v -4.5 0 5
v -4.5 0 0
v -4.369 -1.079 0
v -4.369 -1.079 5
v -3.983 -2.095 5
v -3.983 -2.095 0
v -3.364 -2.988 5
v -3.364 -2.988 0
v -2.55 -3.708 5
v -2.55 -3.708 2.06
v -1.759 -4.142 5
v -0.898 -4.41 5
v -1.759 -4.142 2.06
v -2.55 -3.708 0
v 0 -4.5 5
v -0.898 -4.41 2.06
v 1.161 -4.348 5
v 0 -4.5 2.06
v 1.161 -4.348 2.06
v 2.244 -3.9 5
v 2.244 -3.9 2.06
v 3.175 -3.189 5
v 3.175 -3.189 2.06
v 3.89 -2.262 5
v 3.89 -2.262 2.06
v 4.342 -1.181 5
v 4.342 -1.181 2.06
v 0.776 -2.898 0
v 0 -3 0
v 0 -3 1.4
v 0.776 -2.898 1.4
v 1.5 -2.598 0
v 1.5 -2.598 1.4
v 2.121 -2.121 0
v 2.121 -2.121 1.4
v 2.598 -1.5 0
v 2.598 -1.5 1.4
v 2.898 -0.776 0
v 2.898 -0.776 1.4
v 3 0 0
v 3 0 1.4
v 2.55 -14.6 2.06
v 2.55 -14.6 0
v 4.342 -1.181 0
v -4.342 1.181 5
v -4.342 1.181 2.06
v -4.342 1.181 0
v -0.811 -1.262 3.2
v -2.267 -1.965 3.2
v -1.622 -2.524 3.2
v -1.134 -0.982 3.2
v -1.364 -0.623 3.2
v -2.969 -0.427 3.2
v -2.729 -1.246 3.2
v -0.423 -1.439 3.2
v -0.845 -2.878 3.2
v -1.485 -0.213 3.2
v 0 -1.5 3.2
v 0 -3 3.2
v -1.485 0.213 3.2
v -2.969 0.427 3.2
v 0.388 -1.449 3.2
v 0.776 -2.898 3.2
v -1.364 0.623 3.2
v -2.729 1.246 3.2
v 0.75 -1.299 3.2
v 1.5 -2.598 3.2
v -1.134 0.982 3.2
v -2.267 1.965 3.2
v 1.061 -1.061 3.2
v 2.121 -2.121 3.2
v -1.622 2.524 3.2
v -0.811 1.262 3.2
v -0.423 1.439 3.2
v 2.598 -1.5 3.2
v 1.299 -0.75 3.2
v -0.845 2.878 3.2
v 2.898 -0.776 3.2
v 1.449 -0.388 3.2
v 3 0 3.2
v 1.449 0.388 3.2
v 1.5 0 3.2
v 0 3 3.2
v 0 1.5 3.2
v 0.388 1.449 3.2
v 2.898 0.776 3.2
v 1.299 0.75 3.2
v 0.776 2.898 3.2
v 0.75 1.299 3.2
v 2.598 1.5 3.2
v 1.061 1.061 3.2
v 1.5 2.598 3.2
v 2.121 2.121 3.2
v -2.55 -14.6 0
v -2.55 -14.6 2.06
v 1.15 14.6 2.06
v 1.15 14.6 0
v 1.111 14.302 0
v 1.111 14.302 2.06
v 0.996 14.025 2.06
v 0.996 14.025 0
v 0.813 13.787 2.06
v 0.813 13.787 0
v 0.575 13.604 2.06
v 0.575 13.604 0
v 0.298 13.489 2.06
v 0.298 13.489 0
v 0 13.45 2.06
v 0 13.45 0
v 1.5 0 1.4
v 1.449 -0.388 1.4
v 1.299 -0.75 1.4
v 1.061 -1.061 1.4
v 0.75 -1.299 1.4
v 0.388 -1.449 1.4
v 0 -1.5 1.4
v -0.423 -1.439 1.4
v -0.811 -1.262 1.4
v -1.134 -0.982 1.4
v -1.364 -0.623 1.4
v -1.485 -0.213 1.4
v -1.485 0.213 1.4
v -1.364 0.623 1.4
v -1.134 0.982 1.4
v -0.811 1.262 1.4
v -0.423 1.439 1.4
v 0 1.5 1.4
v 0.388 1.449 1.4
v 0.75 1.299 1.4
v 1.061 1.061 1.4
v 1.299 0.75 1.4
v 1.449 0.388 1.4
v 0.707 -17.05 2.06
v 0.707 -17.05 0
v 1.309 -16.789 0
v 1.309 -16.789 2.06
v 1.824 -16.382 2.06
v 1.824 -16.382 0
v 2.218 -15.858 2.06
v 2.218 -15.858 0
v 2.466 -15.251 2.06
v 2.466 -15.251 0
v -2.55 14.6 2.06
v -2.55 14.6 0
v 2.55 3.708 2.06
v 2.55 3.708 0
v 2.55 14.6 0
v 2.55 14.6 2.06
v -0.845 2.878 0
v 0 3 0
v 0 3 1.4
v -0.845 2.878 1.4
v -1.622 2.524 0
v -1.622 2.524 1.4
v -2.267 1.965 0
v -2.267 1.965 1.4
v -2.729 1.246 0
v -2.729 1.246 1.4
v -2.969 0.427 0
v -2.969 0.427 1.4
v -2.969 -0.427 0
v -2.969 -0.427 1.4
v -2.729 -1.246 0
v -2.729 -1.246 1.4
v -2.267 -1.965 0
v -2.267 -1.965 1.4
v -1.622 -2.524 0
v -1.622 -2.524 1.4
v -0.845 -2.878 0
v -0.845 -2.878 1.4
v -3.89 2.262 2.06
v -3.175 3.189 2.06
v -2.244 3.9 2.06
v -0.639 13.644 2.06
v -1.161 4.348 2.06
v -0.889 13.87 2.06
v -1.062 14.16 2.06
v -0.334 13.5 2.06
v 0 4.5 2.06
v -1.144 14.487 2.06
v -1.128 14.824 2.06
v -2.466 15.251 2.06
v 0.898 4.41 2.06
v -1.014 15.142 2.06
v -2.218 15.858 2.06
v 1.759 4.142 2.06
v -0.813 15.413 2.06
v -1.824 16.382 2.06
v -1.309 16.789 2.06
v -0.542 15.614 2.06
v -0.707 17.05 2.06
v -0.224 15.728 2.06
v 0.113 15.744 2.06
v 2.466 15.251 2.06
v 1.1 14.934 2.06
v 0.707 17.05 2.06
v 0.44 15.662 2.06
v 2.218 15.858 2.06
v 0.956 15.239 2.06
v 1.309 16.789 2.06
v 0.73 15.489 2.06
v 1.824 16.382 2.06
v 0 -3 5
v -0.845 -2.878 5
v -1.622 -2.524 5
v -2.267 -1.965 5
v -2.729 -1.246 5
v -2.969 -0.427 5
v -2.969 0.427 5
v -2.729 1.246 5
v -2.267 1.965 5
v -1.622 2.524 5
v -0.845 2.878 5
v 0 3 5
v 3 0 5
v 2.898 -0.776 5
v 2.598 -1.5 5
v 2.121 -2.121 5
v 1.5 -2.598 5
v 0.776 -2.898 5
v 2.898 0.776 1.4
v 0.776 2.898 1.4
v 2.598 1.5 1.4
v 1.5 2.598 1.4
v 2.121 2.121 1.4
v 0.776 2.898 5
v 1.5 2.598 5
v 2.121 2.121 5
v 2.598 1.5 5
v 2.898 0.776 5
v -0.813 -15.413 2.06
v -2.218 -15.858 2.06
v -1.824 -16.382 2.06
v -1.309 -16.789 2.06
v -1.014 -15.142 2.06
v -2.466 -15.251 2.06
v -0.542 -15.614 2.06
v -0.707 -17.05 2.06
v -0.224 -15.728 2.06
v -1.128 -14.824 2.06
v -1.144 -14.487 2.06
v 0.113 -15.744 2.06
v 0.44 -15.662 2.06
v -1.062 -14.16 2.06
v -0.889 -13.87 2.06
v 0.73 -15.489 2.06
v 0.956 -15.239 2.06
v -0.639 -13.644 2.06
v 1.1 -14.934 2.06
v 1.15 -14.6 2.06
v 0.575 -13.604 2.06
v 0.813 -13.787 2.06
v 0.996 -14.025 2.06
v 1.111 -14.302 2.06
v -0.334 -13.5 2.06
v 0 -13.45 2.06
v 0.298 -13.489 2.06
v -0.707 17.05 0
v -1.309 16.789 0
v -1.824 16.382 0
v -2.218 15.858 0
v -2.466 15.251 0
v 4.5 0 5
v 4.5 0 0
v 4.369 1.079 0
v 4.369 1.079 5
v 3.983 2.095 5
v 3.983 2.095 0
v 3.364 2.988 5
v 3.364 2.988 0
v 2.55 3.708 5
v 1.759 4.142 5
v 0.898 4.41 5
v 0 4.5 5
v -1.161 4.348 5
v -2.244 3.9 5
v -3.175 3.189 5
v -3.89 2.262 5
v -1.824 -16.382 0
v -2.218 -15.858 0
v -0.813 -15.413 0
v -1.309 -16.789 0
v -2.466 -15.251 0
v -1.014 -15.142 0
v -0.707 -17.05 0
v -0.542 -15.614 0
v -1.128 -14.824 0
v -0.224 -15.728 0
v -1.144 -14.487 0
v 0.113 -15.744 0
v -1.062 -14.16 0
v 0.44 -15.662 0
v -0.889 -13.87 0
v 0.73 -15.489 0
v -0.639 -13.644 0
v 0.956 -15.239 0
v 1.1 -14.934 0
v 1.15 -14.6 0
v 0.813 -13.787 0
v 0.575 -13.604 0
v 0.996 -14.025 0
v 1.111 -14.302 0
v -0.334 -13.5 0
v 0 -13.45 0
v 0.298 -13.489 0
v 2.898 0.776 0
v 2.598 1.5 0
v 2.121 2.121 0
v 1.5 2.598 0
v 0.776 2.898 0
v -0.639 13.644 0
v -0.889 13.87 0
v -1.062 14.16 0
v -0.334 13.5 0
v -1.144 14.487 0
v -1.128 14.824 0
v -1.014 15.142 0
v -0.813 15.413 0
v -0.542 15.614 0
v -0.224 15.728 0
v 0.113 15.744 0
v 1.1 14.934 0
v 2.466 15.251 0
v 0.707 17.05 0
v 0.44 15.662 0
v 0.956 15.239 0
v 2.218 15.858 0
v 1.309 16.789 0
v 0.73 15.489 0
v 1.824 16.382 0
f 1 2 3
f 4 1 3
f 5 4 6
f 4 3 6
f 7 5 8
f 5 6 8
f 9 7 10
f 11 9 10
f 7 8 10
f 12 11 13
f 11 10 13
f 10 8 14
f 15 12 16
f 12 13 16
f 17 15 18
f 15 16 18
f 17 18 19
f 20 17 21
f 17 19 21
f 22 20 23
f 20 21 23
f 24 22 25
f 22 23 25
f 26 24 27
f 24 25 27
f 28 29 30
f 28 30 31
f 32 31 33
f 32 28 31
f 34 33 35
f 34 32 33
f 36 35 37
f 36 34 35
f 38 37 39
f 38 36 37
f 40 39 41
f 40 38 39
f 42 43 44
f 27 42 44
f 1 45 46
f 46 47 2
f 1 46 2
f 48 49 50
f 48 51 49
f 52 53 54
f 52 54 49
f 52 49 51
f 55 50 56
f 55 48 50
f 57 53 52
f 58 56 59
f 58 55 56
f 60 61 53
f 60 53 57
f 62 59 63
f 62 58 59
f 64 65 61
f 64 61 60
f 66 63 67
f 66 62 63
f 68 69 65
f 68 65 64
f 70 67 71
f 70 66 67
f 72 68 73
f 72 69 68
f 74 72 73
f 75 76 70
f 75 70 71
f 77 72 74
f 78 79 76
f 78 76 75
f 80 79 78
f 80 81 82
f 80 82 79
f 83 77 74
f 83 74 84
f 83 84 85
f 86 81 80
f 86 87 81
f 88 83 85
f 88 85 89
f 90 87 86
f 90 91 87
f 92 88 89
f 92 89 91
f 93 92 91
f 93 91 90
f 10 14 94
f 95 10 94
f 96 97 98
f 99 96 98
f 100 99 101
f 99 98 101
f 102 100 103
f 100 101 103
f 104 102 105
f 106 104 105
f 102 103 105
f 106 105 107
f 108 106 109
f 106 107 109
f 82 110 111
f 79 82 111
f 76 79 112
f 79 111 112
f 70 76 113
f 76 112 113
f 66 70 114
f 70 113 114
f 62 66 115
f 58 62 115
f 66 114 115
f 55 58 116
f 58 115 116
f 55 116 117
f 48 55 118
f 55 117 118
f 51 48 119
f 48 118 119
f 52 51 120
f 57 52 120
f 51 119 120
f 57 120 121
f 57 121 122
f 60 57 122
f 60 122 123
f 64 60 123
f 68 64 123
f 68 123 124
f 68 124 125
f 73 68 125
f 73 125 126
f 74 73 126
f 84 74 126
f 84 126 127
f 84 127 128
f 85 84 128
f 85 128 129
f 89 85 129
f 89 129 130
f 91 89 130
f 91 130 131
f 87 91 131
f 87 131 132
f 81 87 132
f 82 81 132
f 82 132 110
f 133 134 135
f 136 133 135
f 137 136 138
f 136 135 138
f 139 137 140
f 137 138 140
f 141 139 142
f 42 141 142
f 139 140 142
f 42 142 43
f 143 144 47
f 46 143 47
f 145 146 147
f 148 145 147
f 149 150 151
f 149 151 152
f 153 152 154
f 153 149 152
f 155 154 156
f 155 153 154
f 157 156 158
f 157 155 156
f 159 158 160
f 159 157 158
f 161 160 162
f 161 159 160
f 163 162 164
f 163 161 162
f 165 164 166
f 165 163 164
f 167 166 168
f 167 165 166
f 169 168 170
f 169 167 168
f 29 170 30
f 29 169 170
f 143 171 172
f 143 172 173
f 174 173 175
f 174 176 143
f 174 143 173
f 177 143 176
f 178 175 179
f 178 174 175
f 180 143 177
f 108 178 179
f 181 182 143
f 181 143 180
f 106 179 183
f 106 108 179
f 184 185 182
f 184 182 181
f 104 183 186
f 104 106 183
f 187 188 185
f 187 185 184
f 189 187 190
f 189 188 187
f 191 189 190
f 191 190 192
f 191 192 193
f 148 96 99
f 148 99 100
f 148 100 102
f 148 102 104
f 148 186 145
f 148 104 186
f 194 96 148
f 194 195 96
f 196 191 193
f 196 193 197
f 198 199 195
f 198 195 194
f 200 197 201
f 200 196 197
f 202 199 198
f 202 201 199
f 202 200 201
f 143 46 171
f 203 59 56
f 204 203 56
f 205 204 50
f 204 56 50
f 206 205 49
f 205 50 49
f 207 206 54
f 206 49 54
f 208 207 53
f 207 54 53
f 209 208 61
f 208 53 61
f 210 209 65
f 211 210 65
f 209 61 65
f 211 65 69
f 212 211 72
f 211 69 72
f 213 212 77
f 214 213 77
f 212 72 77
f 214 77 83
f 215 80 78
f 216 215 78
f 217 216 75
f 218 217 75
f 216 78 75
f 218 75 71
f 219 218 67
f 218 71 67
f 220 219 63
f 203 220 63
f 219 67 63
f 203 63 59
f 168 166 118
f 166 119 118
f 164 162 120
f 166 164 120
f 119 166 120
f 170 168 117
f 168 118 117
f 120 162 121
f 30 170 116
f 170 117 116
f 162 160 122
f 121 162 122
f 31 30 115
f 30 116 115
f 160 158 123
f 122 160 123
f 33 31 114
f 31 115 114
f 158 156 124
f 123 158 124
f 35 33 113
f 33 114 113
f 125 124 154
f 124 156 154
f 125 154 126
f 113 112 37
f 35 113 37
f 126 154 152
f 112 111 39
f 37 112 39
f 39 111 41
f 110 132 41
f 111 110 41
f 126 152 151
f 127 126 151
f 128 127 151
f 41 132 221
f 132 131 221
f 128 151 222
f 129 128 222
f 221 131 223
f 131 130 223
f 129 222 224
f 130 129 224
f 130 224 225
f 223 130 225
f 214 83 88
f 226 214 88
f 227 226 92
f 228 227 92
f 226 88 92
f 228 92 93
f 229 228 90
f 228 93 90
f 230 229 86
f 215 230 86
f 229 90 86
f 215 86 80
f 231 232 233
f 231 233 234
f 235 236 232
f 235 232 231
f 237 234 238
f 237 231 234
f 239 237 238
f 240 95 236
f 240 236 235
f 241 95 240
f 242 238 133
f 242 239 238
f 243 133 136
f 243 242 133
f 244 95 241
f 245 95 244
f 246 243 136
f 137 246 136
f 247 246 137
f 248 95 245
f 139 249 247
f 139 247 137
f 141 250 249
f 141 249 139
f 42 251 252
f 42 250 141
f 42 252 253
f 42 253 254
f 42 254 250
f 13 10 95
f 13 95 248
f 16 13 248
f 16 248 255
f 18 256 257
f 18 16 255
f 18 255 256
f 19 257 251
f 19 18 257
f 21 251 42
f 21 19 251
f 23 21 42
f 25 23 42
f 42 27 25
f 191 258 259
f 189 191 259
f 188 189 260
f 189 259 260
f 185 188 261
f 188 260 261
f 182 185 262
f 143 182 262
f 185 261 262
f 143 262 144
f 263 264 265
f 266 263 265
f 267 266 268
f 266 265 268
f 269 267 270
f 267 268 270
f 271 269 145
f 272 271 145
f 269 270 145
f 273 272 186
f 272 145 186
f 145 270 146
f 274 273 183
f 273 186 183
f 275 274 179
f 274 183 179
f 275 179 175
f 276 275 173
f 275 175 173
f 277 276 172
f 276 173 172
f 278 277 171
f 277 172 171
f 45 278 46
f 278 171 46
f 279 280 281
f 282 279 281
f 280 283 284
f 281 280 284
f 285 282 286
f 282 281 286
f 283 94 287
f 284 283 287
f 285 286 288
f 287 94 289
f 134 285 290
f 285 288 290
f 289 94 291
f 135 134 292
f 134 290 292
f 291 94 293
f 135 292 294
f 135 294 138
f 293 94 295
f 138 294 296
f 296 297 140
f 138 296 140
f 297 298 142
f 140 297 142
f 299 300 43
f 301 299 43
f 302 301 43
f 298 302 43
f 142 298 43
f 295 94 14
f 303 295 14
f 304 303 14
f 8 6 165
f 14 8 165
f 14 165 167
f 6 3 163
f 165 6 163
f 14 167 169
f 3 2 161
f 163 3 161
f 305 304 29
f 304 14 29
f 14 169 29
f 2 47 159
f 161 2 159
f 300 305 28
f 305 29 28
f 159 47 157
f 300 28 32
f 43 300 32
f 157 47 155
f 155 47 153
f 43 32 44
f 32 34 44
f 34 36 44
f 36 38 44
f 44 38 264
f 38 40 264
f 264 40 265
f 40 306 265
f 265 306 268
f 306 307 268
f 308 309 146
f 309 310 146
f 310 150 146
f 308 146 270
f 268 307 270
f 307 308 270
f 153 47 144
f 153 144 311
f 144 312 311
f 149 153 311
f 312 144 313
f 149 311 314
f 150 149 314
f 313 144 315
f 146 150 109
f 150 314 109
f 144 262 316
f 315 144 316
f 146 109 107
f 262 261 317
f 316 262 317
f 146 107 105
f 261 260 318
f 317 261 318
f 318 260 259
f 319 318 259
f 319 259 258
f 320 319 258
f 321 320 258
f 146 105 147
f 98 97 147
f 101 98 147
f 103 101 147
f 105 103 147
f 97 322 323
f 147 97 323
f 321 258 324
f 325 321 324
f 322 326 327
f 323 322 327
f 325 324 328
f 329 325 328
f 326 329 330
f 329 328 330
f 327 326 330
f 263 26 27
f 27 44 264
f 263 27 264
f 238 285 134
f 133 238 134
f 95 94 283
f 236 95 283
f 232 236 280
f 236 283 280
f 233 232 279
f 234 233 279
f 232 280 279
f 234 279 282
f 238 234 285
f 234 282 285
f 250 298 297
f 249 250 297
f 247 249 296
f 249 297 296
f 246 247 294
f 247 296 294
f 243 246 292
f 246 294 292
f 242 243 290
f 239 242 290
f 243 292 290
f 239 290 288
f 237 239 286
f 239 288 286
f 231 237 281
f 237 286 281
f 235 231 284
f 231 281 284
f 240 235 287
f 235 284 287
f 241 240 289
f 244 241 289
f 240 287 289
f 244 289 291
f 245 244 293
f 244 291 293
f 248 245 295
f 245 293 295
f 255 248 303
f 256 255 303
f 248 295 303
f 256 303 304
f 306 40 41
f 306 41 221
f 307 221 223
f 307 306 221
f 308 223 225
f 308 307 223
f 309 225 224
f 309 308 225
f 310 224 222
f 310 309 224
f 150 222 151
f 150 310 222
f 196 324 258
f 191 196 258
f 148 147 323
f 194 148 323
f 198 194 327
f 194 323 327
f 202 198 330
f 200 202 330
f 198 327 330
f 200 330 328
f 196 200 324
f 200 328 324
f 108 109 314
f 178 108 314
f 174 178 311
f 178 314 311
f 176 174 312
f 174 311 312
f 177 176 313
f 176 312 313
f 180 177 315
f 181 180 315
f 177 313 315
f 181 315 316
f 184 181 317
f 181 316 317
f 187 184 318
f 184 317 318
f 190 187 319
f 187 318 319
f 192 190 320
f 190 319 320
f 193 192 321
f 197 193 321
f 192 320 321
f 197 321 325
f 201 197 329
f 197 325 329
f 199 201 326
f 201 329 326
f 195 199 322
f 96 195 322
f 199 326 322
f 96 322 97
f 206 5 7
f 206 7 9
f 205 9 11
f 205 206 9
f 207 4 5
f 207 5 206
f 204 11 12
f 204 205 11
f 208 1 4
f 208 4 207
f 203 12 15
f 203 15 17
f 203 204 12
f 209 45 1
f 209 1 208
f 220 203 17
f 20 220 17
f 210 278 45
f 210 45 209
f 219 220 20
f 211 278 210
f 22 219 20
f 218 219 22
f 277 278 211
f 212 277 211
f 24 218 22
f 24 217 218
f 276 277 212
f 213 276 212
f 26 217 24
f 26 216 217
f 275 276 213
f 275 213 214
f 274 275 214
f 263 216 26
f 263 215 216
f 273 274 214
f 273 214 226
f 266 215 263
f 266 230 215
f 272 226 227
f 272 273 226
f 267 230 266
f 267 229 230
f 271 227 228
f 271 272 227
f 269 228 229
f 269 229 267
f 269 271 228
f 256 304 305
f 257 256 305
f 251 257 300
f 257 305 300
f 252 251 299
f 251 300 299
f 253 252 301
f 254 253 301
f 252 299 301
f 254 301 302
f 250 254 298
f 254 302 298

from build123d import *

# Parameters (mm, degrees)
F1_DEPTH = 2.06
F2_DEPTH = 3.2
F3_DEPTH = 5
F4_DEPTH = 1.4


with BuildPart() as f1:
    # F0 (on Top) → F1 (new body)
    with BuildSketch(Plane.XY):
        with BuildLine():
            ThreePointArc((0, -12.05), (1.803122292, -12.796877708), (2.55, -14.6))
            Line((2.55, -14.6), (4.3422653684, -1.1809874978))
            ThreePointArc((4.3422653684, -1.1809874978), (2.7327235736, -3.5752233315), (0, -4.5))
            Line((0, -4.5), (0, -12.05))
        make_face()
        with BuildLine():
            Line((-0.7071067812, -17.05), (0.7071067812, -17.05))
            ThreePointArc((0.7071067812, -17.05), (2.0378447306, -16.1328694837), (2.55, -14.6))
            ThreePointArc((2.55, -14.6), (1.803122292, -12.796877708), (0, -12.05))
            ThreePointArc((0, -12.05), (-1.803122292, -12.796877708), (-2.55, -14.6))
            ThreePointArc((-2.55, -14.6), (-2.0378447306, -16.1328694837), (-0.7071067812, -17.05))
        make_face()
        with BuildLine():
            ThreePointArc((1.15, -14.6), (-0.8131727984, -15.4131727984), (0, -13.45))
            ThreePointArc((0, -13.45), (0.8131727984, -13.7868272016), (1.15, -14.6))
        make_face(mode=Mode.SUBTRACT)
        with BuildLine():
            Line((-2.55, -3.7077621283), (-2.55, -14.6))
            ThreePointArc((-2.55, -14.6), (-1.803122292, -12.796877708), (0, -12.05))
            Line((0, -12.05), (0, -4.5))
            ThreePointArc((0, -4.5), (-1.335116179, -4.2973788277), (-2.55, -3.7077621283))
        make_face()
        with BuildLine():
            Line((0, 3), (0, 4.5))
            ThreePointArc((0, 4.5), (-2.7327235736, 3.5752233315), (-4.3422653684, 1.1809874978))
            Line((-4.3422653684, 1.1809874978), (-4.5, 0))
            ThreePointArc((-4.5, 0), (-3.9827754142, -2.0946360066), (-2.55, -3.7077621283))
            ThreePointArc((-2.55, -3.7077621283), (-1.335116179, -4.2973788277), (0, -4.5))
            Line((0, -4.5), (0, -3))
            ThreePointArc((0, -3), (-3, 0), (0, 3))
        make_face()
        with BuildLine():
            Line((0, 1.5), (0, 3))
            ThreePointArc((0, 3), (-3, 0), (0, -3))
            Line((0, -3), (0, -1.5))
            ThreePointArc((0, -1.5), (-1.5, 0), (0, 1.5))
        make_face()
        with BuildLine():
            ThreePointArc((-4.3422653684, 1.1809874978), (-2.7327235736, 3.5752233315), (0, 4.5))
            Line((0, 4.5), (0, 12.05))
            ThreePointArc((0, 12.05), (-1.803122292, 12.796877708), (-2.55, 14.6))
            Line((-2.55, 14.6), (-4.3422653684, 1.1809874978))
        make_face()
        with BuildLine():
            ThreePointArc((0, 4.5), (1.335116179, 4.2973788277), (2.55, 3.7077621283))
            Line((2.55, 3.7077621283), (2.55, 14.6))
            ThreePointArc((2.55, 14.6), (1.803122292, 12.796877708), (0, 12.05))
            Line((0, 12.05), (0, 4.5))
        make_face()
        with BuildLine():
            ThreePointArc((2.55, 14.6), (2.0378447306, 16.1328694837), (0.7071067812, 17.05))
            Line((0.7071067812, 17.05), (-0.7071067812, 17.05))
            ThreePointArc((-0.7071067812, 17.05), (-2.0378447306, 16.1328694837), (-2.55, 14.6))
            ThreePointArc((-2.55, 14.6), (-1.803122292, 12.796877708), (0, 12.05))
            ThreePointArc((0, 12.05), (1.803122292, 12.796877708), (2.55, 14.6))
        make_face()
        with BuildLine():
            ThreePointArc((1.15, 14.6), (0.8131727984, 13.7868272016), (0, 13.45))
            ThreePointArc((0, 13.45), (-0.8131727984, 15.4131727984), (1.15, 14.6))
        make_face(mode=Mode.SUBTRACT)
        with BuildLine():
            Line((4.3422653684, -1.1809874978), (4.5, 0))
            ThreePointArc((4.5, 0), (3.9827754142, 2.0946360066), (2.55, 3.7077621283))
            ThreePointArc((2.55, 3.7077621283), (1.335116179, 4.2973788277), (0, 4.5))
            Line((0, 4.5), (0, 3))
            ThreePointArc((0, 3), (2.1213203436, 2.1213203436), (3, 0))
            ThreePointArc((3, 0), (2.1213203436, -2.1213203436), (0, -3))
            Line((0, -3), (0, -4.5))
            ThreePointArc((0, -4.5), (2.7327235736, -3.5752233315), (4.3422653684, -1.1809874978))
        make_face()
        with BuildLine():
            ThreePointArc((3, 0), (2.1213203436, 2.1213203436), (0, 3))
            Line((0, 3), (0, 1.5))
            ThreePointArc((0, 1.5), (1.0606601718, 1.0606601718), (1.5, 0))
            ThreePointArc((1.5, 0), (1.0606601718, -1.0606601718), (0, -1.5))
            Line((0, -1.5), (0, -3))
            ThreePointArc((0, -3), (2.1213203436, -2.1213203436), (3, 0))
        make_face()
    extrude(amount=F1_DEPTH)

    # F0 (on Top) → F2 (join)
    with BuildSketch(Plane.XY):
        with BuildLine():
            Line((0, 1.5), (0, 3))
            ThreePointArc((0, 3), (-3, 0), (0, -3))
            Line((0, -3), (0, -1.5))
            ThreePointArc((0, -1.5), (-1.5, 0), (0, 1.5))
        make_face()
        with BuildLine():
            ThreePointArc((3, 0), (2.1213203436, 2.1213203436), (0, 3))
            Line((0, 3), (0, 1.5))
            ThreePointArc((0, 1.5), (1.0606601718, 1.0606601718), (1.5, 0))
            ThreePointArc((1.5, 0), (1.0606601718, -1.0606601718), (0, -1.5))
            Line((0, -1.5), (0, -3))
            ThreePointArc((0, -3), (2.1213203436, -2.1213203436), (3, 0))
        make_face()
    extrude(amount=F2_DEPTH)

    # F0 (on Top) → F3 (join)
    with BuildSketch(Plane.XY):
        with BuildLine():
            Line((0, 3), (0, 4.5))
            ThreePointArc((0, 4.5), (-2.7327235736, 3.5752233315), (-4.3422653684, 1.1809874978))
            Line((-4.3422653684, 1.1809874978), (-4.5, 0))
            ThreePointArc((-4.5, 0), (-3.9827754142, -2.0946360066), (-2.55, -3.7077621283))
            ThreePointArc((-2.55, -3.7077621283), (-1.335116179, -4.2973788277), (0, -4.5))
            Line((0, -4.5), (0, -3))
            ThreePointArc((0, -3), (-3, 0), (0, 3))
        make_face()
        with BuildLine():
            Line((4.3422653684, -1.1809874978), (4.5, 0))
            ThreePointArc((4.5, 0), (3.9827754142, 2.0946360066), (2.55, 3.7077621283))
            ThreePointArc((2.55, 3.7077621283), (1.335116179, 4.2973788277), (0, 4.5))
            Line((0, 4.5), (0, 3))
            ThreePointArc((0, 3), (2.1213203436, 2.1213203436), (3, 0))
            ThreePointArc((3, 0), (2.1213203436, -2.1213203436), (0, -3))
            Line((0, -3), (0, -4.5))
            ThreePointArc((0, -4.5), (2.7327235736, -3.5752233315), (4.3422653684, -1.1809874978))
        make_face()
    extrude(amount=F3_DEPTH)

    # F0 (on Top) → F4 (cut)
    with BuildSketch(Plane.XY):
        with BuildLine():
            Line((0, 1.5), (0, 3))
            ThreePointArc((0, 3), (-3, 0), (0, -3))
            Line((0, -3), (0, -1.5))
            ThreePointArc((0, -1.5), (-1.5, 0), (0, 1.5))
        make_face()
        with BuildLine():
            ThreePointArc((3, 0), (2.1213203436, 2.1213203436), (0, 3))
            Line((0, 3), (0, 1.5))
            ThreePointArc((0, 1.5), (1.0606601718, 1.0606601718), (1.5, 0))
            ThreePointArc((1.5, 0), (1.0606601718, -1.0606601718), (0, -1.5))
            Line((0, -1.5), (0, -3))
            ThreePointArc((0, -3), (2.1213203436, -2.1213203436), (3, 0))
        make_face()
    extrude(amount=F4_DEPTH, mode=Mode.SUBTRACT)


solid = f1.part
